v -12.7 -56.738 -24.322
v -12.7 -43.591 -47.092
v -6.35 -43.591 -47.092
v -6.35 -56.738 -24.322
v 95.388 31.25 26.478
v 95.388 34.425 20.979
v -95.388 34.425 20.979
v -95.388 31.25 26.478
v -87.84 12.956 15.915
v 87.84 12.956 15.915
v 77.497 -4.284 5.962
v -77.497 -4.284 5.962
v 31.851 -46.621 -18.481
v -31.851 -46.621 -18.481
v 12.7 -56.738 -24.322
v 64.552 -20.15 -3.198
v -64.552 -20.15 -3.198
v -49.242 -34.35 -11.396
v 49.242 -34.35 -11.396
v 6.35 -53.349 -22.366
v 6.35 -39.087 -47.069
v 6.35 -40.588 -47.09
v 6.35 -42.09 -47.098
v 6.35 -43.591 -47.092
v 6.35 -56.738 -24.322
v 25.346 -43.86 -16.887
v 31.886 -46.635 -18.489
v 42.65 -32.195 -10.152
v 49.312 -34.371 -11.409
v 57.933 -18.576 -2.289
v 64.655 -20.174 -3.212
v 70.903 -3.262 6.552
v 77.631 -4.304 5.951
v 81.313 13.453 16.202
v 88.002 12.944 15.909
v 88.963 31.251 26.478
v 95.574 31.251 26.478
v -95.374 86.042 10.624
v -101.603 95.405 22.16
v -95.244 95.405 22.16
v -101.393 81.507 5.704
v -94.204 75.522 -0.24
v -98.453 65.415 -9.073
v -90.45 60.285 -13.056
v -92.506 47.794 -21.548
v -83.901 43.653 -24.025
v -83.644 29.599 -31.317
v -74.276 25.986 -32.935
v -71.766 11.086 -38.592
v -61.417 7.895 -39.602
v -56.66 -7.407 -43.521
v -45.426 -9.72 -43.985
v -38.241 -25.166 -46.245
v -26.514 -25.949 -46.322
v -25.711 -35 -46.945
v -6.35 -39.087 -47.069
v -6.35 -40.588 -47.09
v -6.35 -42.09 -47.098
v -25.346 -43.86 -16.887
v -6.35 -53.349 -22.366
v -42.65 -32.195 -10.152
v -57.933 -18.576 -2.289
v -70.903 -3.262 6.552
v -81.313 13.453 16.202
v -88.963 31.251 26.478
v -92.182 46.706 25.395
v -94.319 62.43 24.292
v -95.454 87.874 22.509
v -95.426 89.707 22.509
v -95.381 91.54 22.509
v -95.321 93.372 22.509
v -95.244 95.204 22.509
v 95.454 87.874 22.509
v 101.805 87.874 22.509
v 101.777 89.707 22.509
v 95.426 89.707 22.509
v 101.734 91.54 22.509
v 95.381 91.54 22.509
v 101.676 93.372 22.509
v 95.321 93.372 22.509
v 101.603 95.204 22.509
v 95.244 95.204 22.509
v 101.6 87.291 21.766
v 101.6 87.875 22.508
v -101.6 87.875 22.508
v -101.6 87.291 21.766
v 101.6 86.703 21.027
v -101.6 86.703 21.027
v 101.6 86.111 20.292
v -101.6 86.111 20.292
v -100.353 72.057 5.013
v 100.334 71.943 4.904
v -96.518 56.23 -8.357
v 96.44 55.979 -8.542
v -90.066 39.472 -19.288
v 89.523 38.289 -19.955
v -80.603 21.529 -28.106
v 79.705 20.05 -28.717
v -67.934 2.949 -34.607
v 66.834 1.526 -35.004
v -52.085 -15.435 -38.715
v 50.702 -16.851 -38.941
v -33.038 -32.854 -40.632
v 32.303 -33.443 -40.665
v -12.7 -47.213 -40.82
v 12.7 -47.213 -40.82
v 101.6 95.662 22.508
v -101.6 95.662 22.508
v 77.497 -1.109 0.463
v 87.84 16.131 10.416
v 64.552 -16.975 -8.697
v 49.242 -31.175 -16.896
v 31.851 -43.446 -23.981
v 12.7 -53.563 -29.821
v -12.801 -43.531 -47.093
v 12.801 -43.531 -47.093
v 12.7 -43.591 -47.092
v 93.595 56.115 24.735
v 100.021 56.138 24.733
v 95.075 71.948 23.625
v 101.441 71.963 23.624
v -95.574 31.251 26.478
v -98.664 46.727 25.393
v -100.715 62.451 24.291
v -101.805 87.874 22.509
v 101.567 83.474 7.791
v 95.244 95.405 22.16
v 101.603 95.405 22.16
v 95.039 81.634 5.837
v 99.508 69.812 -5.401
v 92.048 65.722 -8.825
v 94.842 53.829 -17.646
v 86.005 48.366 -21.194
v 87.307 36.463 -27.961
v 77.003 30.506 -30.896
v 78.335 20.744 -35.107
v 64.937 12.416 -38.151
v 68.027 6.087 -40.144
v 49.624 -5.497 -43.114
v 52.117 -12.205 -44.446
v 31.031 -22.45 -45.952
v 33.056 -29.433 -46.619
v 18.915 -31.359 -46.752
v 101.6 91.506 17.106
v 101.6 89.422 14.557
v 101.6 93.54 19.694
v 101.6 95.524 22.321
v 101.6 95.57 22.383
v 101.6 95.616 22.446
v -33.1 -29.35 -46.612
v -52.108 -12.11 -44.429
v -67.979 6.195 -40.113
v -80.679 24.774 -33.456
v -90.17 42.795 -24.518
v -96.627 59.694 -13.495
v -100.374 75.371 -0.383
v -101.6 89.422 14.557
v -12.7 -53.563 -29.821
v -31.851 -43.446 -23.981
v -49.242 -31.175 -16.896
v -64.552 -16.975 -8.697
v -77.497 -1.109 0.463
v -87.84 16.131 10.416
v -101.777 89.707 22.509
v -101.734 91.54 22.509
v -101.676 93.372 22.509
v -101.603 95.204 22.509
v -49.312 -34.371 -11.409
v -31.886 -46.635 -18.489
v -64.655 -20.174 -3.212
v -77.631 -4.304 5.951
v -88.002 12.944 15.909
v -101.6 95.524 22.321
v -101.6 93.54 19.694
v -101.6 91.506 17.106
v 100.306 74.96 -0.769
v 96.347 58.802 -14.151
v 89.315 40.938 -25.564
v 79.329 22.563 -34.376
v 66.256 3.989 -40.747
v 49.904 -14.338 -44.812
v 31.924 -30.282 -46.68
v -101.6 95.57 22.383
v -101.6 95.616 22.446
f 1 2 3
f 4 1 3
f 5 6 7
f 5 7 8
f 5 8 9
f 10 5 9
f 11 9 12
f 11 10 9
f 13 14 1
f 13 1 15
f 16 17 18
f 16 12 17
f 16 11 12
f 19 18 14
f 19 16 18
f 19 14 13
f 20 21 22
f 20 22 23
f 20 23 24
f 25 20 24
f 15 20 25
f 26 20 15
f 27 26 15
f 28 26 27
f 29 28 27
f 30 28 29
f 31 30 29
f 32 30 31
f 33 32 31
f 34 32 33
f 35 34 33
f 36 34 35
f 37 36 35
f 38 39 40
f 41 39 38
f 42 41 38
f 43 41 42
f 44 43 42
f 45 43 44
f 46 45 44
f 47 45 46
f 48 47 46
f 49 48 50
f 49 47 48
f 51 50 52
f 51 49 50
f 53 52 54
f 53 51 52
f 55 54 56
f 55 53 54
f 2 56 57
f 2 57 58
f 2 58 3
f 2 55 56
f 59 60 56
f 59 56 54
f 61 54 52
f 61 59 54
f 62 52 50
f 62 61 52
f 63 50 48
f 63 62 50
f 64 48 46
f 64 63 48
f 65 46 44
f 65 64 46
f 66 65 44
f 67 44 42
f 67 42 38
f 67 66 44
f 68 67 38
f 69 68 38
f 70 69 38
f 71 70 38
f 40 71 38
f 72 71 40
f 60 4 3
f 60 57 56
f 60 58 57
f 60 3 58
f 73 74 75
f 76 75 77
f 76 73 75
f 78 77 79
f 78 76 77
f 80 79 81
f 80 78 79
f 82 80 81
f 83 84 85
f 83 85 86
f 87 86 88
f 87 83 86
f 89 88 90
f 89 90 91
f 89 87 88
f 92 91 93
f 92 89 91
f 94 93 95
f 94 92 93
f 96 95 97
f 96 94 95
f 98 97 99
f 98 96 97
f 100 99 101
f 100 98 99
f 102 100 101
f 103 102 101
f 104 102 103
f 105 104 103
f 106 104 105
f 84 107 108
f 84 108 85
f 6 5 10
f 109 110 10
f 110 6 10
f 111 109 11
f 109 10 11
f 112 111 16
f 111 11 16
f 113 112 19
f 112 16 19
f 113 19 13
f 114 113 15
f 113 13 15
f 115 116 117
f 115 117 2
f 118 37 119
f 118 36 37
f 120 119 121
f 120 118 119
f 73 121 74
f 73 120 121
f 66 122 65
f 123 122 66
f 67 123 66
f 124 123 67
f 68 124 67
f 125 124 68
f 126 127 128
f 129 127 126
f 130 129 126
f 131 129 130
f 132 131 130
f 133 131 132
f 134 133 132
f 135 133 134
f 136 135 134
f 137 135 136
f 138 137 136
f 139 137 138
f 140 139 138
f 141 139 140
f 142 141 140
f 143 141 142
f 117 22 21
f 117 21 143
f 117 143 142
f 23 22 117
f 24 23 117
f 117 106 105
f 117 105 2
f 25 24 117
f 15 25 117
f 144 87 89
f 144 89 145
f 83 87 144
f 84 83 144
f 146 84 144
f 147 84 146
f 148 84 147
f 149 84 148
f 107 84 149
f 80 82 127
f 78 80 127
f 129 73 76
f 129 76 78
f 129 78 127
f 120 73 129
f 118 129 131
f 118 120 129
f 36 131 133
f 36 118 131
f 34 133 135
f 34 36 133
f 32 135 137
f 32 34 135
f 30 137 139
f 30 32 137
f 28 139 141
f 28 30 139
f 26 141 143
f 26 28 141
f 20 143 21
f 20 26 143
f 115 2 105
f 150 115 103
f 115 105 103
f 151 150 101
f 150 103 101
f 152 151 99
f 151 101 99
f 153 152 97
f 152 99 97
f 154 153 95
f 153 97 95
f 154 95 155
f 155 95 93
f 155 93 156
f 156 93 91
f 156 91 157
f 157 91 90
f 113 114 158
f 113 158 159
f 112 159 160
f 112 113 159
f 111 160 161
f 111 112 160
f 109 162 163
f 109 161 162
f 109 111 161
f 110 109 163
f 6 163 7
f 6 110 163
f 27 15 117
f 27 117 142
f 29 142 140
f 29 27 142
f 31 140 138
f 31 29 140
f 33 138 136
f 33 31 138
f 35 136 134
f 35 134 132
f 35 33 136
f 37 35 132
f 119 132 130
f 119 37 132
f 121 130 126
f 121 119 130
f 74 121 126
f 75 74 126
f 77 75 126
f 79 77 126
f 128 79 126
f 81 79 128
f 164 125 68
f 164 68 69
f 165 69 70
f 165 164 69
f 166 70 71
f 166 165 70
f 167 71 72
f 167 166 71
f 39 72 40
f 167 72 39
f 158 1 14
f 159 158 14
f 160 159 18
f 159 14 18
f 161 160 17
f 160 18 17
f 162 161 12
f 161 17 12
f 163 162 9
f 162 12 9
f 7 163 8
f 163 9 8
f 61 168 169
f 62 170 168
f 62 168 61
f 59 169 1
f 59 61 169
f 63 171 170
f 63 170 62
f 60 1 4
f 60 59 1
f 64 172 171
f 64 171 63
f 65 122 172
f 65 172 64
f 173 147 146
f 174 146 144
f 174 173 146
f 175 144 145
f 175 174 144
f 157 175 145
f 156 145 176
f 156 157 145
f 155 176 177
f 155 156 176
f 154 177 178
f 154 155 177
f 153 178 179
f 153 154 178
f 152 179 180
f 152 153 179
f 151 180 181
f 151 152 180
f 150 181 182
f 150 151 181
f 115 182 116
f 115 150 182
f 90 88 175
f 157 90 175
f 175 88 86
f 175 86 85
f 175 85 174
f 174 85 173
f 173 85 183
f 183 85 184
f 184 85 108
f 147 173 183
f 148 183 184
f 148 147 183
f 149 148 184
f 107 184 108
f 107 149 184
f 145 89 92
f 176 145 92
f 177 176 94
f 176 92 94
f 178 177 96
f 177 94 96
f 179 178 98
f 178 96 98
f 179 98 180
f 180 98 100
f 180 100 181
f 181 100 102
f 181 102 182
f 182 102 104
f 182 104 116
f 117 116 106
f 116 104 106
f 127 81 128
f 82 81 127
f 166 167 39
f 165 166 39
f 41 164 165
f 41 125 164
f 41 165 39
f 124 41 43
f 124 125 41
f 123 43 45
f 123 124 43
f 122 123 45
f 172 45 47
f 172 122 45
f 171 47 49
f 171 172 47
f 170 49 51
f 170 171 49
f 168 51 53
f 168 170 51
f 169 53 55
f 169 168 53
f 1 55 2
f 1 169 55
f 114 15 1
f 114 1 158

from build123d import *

# Parameters (mm, degrees)
F1_DEPTH      = 101.6
F1_DEPTH_BACK = 101.6
F3_DEPTH      = 62.992
F5_DEPTH      = 50.8
F6_W          = 218.0573865771
F6_H          = 142.2193944454
F7_DEPTH      = 109.22
F7_DEPTH_BACK = 114.3


with BuildPart() as f1:
    # F0 (on Right) → F1 (new body, two sides)
    with BuildSketch(Plane.YZ) as f1_sk:
        with BuildLine():
            Line((-47.2127604418, -40.8199376472), (-43.5914381401, -47.0922518644))
            ThreePointArc((-43.5914381401, -47.0922518644), (34.3986779906, -29.0247138413), (95.6622395582, 22.5084809787))
            Line((95.6622395582, 22.5084809787), (87.8752781813, 22.5084809787))
            ThreePointArc((87.8752781813, 22.5084809787), (27.8926619073, -25.2852185024), (-47.2127604418, -40.8199376472))
        make_face()
    extrude(amount=F1_DEPTH)
    extrude(f1_sk.sketch, amount=-F1_DEPTH_BACK)


with BuildPart() as f1b:
    # F0 (on Right) → F1, piece 2 (new body, two sides)
    with BuildSketch(Plane.YZ) as f1_2_sk:
        Polygon((-56.7377604418, -24.3221537051), (-53.5627604418, -29.8214150191), (34.4254205826, 20.9785849809), (31.2504205826, 26.4778462949), align=None)
    extrude(amount=F1_DEPTH)
    extrude(f1_2_sk.sketch, amount=-F1_DEPTH_BACK)


with BuildPart() as f3_tool:
    # F2 (on face) → F3 (new body)
    with BuildSketch(Plane(origin=(0, -3.6526386188, 6.3265556694), x_dir=(1, 0, 0), z_dir=(0, -0.5, 0.8660254038))):
        with BuildLine():
            Line((-101.6, 84.7203440245), (-101.6, 85.6125354767))
            ThreePointArc((-101.6, 85.6125354767), (-101.6006026704, 85.1664397506), (-101.6, 84.7203440245))
        make_face()
        with BuildLine():
            ThreePointArc((-12.7, -61.297418749), (-77.5203666659, -0.6906284654), (-101.6, 84.7203440245))
            Line((-101.6, 84.7203440245), (-101.6, -61.297418749))
            Line((-101.6, -61.297418749), (-12.7, -61.297418749))
        make_face()
        with BuildLine():
            Line((101.6, -61.297418749), (101.6, 84.7203440245))
            ThreePointArc((101.6, 84.7203440245), (77.5203666659, -0.6906284654), (12.7, -61.297418749))
            Line((12.7, -61.297418749), (101.6, -61.297418749))
        make_face()
        with BuildLine():
            ThreePointArc((101.6, 84.7203440245), (101.6006026704, 85.1664397506), (101.6, 85.6125354767))
            Line((101.6, 85.6125354767), (101.6, 84.7203440245))
        make_face()
    extrude(amount=-F3_DEPTH)


with BuildPart() as f1_1:
    add(f1.part)

    # F3: cut by f3_tool
    add(f3_tool.part, mode=Mode.SUBTRACT)


with BuildPart() as f1b_1:
    add(f1b.part)

    # F3: cut by f3_tool
    add(f3_tool.part, mode=Mode.SUBTRACT)


with BuildPart() as f5:
    # F4 (on face) → F5 (new body)
    with BuildSketch(Plane(origin=(0, -3.6526386188, 6.3265556694), x_dir=(1, 0, 0), z_dir=(0, -0.5, 0.8660254038))):
        with BuildLine():
            Line((-95.2443582139, 93.7031581998), (-101.6029715538, 93.7031581998))
            ThreePointArc((-101.6029715538, 93.7031581998), (-79.9329427522, 3.1362137084), (-12.7, -61.297418749))
            Line((-12.7, -61.297418749), (-6.35, -61.297418749))
            Line((-6.35, -61.297418749), (-6.35, -57.3844169627))
            ThreePointArc((-6.35, -57.3844169627), (-73.5424260517, 4.7769059957), (-95.2443582139, 93.7031581998))
        make_face()
    extrude(amount=-F5_DEPTH)


with BuildPart() as f5b:
    # F4 (on face) → F5, piece 2 (new body)
    with BuildSketch(Plane(origin=(0, -3.6526386188, 6.3265556694), x_dir=(1, 0, 0), z_dir=(0, -0.5, 0.8660254038))):
        with BuildLine():
            Line((6.35, -61.297418749), (12.7, -61.297418749))
            ThreePointArc((12.7, -61.297418749), (79.9329427522, 3.1362137084), (101.6029715538, 93.7031581998))
            Line((101.6029715538, 93.7031581998), (95.2443582139, 93.7031581998))
            ThreePointArc((95.2443582139, 93.7031581998), (73.5424260517, 4.7769059957), (6.35, -57.3844169627))
            Line((6.35, -57.3844169627), (6.35, -61.297418749))
        make_face()
    extrude(amount=-F5_DEPTH)


with BuildPart() as f7_tool:
    # F6 (on Right) → F7 (new body, two sides)
    with BuildSketch(Plane.YZ) as f7_sk:
        with Locations((17.5203569233, -1.9469410181)):
            Rectangle(F6_W, F6_H)
        with BuildLine():
            Line((-56.7377969396, -24.3221706548), (31.2503799796, 26.477959007))
            Line((31.2503799796, 26.477959007), (87.8742308381, 22.5086007267))
            Line((87.8742308381, 22.5086007267), (95.6624150276, 22.5086007267))
            ThreePointArc((95.6624150276, 22.5086007267), (34.3932667097, -29.0136506245), (-43.591439724, -47.0922701061))
            Line((-43.591439724, -47.0922701061), (-56.7377969396, -24.3221706548))
        make_face(mode=Mode.SUBTRACT)
    extrude(amount=-F7_DEPTH)
    extrude(f7_sk.sketch, amount=F7_DEPTH_BACK)


with BuildPart() as f1_2:
    add(f1_1.part)

    # F7: cut by f7_tool
    add(f7_tool.part, mode=Mode.SUBTRACT)


with BuildPart() as f5_1:
    add(f5.part)

    # F7: cut by f7_tool
    add(f7_tool.part, mode=Mode.SUBTRACT)


with BuildPart() as f5b_1:
    add(f5b.part)

    # F7: cut by f7_tool
    add(f7_tool.part, mode=Mode.SUBTRACT)


solid = Compound([f1b_1.part, f1_2.part, f5_1.part, f5b_1.part])
